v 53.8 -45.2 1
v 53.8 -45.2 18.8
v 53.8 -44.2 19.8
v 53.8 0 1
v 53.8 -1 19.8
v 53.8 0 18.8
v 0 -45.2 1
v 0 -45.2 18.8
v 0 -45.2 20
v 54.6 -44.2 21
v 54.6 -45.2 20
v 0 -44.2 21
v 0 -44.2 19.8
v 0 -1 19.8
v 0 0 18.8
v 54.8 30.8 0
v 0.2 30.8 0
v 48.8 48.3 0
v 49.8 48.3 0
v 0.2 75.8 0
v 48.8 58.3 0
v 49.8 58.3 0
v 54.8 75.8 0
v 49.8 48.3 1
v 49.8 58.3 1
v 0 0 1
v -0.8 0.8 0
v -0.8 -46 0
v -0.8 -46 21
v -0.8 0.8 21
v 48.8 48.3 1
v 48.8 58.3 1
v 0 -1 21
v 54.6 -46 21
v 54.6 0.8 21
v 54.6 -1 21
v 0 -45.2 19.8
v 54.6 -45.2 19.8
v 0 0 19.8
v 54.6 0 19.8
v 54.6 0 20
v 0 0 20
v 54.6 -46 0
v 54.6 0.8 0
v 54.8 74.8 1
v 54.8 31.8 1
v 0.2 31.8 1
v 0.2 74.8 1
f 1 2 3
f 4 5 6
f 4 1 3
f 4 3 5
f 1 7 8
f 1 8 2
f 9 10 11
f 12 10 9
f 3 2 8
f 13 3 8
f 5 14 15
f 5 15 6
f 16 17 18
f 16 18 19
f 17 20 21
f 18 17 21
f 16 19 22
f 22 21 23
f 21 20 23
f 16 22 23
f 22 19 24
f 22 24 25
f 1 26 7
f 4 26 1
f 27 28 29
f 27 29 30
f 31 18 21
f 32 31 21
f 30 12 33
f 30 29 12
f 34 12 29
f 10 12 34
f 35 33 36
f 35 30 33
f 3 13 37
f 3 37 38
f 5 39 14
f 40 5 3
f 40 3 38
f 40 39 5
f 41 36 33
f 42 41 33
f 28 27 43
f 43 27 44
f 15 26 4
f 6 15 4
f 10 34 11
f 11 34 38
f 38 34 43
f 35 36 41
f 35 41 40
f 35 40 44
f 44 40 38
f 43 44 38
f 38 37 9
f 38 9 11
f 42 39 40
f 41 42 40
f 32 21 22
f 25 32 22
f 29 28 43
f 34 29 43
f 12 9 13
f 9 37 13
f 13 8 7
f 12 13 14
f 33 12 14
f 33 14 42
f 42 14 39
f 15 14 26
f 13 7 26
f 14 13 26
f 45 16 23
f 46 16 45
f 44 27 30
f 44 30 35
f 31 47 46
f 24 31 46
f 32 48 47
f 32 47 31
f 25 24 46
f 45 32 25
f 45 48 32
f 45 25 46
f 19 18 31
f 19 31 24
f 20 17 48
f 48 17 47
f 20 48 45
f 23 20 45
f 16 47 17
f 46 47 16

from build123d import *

# Parameters (mm, degrees)
F0_W       = 55.4
F0_H       = 46.8
F0_W_2     = 53.8
F0_H_2     = 45.2
F1_DEPTH   = 21
F2_DEPTH   = 1
F3_W       = 53.8
F3_H       = 1
F5_DEPTH   = 1
F4_W       = 53.8
F4_H       = 1
F6_DEPTH   = 1
F9_DEPTH   = 0.8
F0_W_3     = 54.6
F0_H_3     = 45
F0_W_4     = 1
F0_H_4     = 10
F10_DEPTH  = 1
F11_SIZE   = 0.99999
F11_2_SIZE = 0.99999


# Not quite as in the source:
# - a fillet or chamfer is up to 0.001 mm smaller than in the source, because OpenCascade refuses the exact size
# - a feature of the source that left no trace in its solid (it failed there, or was rolled back) is left out
# - a feature names something its author has since deleted; it is built from what else it names


with BuildPart() as f1:
    # F0 (on Top) → F1 (new body)
    with BuildSketch(Plane.XY):
        with Locations((26.9, -22.6)):
            Rectangle(F0_W, F0_H)
        with Locations((26.9, -22.6)):
            Rectangle(F0_W_2, F0_H_2, mode=Mode.SUBTRACT)
    extrude(amount=F1_DEPTH)

    # F0 (on Top) → F2 (join)
    with BuildSketch(Plane.XY):
        with Locations((26.9, -22.6)):
            Rectangle(F0_W_2, F0_H_2)
    extrude(amount=F2_DEPTH)

    # F3 (on face) → F5 (join)
    with BuildSketch(Plane(origin=(0, -45.2, 0), x_dir=(-1, 0, 0), z_dir=(0, 1, 0))):
        with Locations((-26.9, 20.5)):
            Rectangle(F3_W, F3_H)
        with Locations((-26.9, 19.3)):
            Rectangle(F3_W, F3_H)
    extrude(amount=F5_DEPTH)

    # F4 (on face) → F6 (join)
    with BuildSketch(Plane.XZ):
        with Locations((26.9, 19.3)):
            Rectangle(F4_W, F4_H)
        with Locations((26.9, 20.5)):
            Rectangle(F4_W, F4_H)
    extrude(amount=F6_DEPTH)

    # F8 (on face) → F9 (cut, through all)
    with BuildSketch(Plane(origin=(53.8, 0, 0), x_dir=(0, -1, 0), z_dir=(-1, 0, 0))):
        Polygon((0, 19.8), (1, 19.8), (44.2, 19.8), (45.2, 19.8), (45.2, 20), (44.2, 20), (44.2, 21), (1, 21), (1, 20), (0, 20), align=None)
    extrude(amount=-F9_DEPTH, mode=Mode.SUBTRACT)

    # F11#2 (size 1 in the source; OpenCascade refuses exactly that, so slightly less here)
    f11_2_edges = [f1.edges().sort_by_distance(p)[0] for p in [
        (27.3, -1, 20),
        (26.9, -1, 18.8),
        (26.9, -44.2, 18.8),
        (27.3, -44.2, 20),
    ]]
    chamfer(f11_2_edges, length=F11_2_SIZE)


with BuildPart() as f10:
    # F0 (on Top) → F10 (new body)
    with BuildSketch(Plane.XY):
        with Locations((27.5, 53.3)):
            Rectangle(F0_W_3, F0_H_3)
        with Locations((49.3, 53.3)):
            Rectangle(F0_W_4, F0_H_4, mode=Mode.SUBTRACT)
    extrude(amount=F10_DEPTH)

    # F11 (size 1 in the source; OpenCascade refuses exactly that, so slightly less here)
    f11_edges = [f10.edges().sort_by_distance(p)[0] for p in [
        (27.5, 30.8, 1),
        (27.5, 75.8, 1),
    ]]
    chamfer(f11_edges, length=F11_SIZE)


solid = Compound([f1.part, f10.part])
